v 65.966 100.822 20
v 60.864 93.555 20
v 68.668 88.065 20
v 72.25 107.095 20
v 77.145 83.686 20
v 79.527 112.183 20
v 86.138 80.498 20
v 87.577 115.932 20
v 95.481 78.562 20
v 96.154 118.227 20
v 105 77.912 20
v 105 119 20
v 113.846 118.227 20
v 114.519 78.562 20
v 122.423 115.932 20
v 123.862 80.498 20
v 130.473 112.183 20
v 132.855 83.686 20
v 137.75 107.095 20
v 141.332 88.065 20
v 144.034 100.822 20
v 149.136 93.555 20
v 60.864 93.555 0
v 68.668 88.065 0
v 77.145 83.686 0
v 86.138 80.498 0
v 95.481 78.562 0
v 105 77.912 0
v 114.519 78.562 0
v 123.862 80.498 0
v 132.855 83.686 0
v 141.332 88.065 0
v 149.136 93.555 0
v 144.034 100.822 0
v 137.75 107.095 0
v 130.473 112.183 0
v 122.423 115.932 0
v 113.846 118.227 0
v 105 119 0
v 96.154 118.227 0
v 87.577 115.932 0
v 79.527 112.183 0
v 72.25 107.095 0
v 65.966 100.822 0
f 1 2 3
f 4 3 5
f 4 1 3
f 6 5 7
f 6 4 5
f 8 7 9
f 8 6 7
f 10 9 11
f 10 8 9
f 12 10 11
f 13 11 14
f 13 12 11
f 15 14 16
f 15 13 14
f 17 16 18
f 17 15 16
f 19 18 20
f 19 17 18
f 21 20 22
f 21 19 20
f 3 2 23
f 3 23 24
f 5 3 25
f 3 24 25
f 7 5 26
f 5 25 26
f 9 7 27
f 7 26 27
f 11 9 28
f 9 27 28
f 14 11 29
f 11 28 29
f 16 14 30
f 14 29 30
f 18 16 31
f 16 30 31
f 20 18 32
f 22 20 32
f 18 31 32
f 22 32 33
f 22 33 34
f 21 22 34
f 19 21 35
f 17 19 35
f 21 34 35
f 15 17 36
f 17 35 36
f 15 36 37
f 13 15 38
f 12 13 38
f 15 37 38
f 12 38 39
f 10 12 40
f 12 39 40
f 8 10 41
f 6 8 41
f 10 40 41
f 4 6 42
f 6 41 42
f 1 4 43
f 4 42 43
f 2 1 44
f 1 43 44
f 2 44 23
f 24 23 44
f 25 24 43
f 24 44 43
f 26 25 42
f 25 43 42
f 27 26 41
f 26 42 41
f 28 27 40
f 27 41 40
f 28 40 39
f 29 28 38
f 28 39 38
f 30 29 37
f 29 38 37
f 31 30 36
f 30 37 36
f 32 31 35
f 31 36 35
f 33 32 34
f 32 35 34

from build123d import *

# Parameters (mm, degrees)
CYLINDER005_R     = 51
CYLINDER005_DEPTH = 20
CYLINDER004_R     = 70.0875
CYLINDER004_DEPTH = 20


with BuildPart() as cylinder005:
    # Cylinder005 → Cylinder005 (new body)
    with BuildSketch(Plane(origin=(105, 68, 0), x_dir=(1, 0, 0), z_dir=(0, 0, 1))):
        Circle(CYLINDER005_R)
    extrude(amount=CYLINDER005_DEPTH)


with BuildPart() as inlet:
    # Cylinder004 → Cylinder004 (new body)
    with BuildSketch(Plane(origin=(105, 148, 0), x_dir=(1, 0, 0), z_dir=(0, 0, 1))):
        Circle(CYLINDER004_R)
    extrude(amount=CYLINDER004_DEPTH)

    # Common: intersect Cylinder005
    add(cylinder005.part, mode=Mode.INTERSECT)


solid = inlet.part
